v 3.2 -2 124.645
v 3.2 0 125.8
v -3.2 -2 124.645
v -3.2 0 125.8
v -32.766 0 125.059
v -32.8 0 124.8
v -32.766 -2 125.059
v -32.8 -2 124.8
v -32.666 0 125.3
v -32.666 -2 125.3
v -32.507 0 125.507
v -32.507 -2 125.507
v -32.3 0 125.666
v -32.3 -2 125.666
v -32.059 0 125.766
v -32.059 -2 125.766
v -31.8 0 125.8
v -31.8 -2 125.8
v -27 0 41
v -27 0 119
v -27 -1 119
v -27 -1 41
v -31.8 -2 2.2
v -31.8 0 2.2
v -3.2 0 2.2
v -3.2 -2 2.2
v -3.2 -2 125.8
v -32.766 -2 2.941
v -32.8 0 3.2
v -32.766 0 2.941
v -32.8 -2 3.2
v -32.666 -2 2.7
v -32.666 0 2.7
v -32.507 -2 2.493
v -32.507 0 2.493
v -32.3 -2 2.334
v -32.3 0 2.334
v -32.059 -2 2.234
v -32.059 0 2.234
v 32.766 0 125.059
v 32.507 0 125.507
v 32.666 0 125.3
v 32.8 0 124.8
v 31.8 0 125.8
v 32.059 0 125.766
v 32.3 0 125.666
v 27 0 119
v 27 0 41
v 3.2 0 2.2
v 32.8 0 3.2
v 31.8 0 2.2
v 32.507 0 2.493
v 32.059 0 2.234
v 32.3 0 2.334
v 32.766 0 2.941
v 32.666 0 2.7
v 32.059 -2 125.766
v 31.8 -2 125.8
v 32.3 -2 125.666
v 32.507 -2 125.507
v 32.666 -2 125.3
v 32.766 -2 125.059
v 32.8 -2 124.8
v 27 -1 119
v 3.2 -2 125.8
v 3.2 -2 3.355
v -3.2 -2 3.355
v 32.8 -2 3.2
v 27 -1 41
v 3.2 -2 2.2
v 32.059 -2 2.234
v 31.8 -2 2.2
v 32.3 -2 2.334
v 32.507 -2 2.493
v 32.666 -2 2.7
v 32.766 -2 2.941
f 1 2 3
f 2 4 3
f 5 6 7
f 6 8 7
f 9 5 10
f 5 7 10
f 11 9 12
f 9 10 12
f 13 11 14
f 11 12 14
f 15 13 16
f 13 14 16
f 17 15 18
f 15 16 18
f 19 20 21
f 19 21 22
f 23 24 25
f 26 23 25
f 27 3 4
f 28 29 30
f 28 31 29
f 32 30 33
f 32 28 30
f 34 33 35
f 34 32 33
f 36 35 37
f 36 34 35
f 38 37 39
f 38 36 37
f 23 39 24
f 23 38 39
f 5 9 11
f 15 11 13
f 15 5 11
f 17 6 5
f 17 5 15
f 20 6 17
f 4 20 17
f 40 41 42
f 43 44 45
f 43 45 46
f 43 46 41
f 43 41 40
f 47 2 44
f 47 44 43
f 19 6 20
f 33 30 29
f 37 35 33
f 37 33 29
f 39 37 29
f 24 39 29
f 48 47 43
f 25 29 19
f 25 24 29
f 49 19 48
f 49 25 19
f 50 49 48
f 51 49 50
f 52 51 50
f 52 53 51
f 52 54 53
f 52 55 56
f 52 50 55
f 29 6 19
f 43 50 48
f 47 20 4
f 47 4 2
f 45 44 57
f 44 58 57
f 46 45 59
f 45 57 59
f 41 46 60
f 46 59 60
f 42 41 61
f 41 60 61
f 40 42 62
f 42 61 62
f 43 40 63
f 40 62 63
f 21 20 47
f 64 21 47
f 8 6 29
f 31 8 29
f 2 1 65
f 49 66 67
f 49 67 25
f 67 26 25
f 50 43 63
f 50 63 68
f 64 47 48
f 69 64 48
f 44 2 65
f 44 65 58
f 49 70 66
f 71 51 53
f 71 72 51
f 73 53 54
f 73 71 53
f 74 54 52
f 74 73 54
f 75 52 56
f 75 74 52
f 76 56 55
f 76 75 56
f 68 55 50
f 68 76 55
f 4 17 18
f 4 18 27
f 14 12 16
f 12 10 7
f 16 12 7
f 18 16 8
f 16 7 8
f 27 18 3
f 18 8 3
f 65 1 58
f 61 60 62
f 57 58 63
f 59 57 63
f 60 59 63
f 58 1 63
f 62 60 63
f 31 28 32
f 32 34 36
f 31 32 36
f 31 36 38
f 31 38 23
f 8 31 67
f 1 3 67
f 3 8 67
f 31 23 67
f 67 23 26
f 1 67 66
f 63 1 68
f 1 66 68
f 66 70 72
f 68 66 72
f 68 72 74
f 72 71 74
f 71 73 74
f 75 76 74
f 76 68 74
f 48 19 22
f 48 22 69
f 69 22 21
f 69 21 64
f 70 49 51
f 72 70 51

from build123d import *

# Parameters (mm, degrees)
SKETCH_1_W          = 65.6
SKETCH_1_H          = 123.6
EXTRUDE_1_DEPTH     = 2
CUT_EXTRUDE_3_DEPTH = 3.2
SKETCH_3_W          = 54
SKETCH_3_H          = 78
CUT_EXTRUDE_2_DEPTH = 1
FILLET_1_R          = 1


with BuildPart() as part:
    # 草图1 → 凸台-拉伸1 (new body)
    with BuildSketch(Plane(origin=(0, 0, 0), x_dir=(1, 0, 0), z_dir=(0, 1, 0))):
        with Locations((0, -64)):
            Rectangle(SKETCH_1_W, SKETCH_1_H)
    extrude(amount=-EXTRUDE_1_DEPTH)

    # 草图4 → 切除-拉伸3 (cut, symmetric)
    with BuildSketch(Plane(origin=(0, 0, 0), x_dir=(0, 0, -1), z_dir=(1, 0, 0))):
        Polygon((-125.8, 0), (-124.645299462, -2), (-125.8, -2), align=None)
        Polygon((-2.2, 0), (-2.2, -2), (-3.354700538, -2), align=None)
    extrude(amount=CUT_EXTRUDE_3_DEPTH, both=True, mode=Mode.SUBTRACT)

    # 草图3 → 切除-拉伸2 (cut)
    with BuildSketch(Plane(origin=(0, 0, 0), x_dir=(1, 0, 0), z_dir=(0, 1, 0))):
        with Locations((0, -80)):
            Rectangle(SKETCH_3_W, SKETCH_3_H)
    extrude(amount=-CUT_EXTRUDE_2_DEPTH, mode=Mode.SUBTRACT)

    # 圆角1
    fillet_1_edges = [part.edges().sort_by_distance(p)[0] for p in [
        (32.8, -1, 125.8),
        (32.8, -1, 2.2),
        (-32.8, -1, 2.2),
        (-32.8, -1, 125.8),
    ]]
    fillet(fillet_1_edges, radius=FILLET_1_R)


solid = part.part
